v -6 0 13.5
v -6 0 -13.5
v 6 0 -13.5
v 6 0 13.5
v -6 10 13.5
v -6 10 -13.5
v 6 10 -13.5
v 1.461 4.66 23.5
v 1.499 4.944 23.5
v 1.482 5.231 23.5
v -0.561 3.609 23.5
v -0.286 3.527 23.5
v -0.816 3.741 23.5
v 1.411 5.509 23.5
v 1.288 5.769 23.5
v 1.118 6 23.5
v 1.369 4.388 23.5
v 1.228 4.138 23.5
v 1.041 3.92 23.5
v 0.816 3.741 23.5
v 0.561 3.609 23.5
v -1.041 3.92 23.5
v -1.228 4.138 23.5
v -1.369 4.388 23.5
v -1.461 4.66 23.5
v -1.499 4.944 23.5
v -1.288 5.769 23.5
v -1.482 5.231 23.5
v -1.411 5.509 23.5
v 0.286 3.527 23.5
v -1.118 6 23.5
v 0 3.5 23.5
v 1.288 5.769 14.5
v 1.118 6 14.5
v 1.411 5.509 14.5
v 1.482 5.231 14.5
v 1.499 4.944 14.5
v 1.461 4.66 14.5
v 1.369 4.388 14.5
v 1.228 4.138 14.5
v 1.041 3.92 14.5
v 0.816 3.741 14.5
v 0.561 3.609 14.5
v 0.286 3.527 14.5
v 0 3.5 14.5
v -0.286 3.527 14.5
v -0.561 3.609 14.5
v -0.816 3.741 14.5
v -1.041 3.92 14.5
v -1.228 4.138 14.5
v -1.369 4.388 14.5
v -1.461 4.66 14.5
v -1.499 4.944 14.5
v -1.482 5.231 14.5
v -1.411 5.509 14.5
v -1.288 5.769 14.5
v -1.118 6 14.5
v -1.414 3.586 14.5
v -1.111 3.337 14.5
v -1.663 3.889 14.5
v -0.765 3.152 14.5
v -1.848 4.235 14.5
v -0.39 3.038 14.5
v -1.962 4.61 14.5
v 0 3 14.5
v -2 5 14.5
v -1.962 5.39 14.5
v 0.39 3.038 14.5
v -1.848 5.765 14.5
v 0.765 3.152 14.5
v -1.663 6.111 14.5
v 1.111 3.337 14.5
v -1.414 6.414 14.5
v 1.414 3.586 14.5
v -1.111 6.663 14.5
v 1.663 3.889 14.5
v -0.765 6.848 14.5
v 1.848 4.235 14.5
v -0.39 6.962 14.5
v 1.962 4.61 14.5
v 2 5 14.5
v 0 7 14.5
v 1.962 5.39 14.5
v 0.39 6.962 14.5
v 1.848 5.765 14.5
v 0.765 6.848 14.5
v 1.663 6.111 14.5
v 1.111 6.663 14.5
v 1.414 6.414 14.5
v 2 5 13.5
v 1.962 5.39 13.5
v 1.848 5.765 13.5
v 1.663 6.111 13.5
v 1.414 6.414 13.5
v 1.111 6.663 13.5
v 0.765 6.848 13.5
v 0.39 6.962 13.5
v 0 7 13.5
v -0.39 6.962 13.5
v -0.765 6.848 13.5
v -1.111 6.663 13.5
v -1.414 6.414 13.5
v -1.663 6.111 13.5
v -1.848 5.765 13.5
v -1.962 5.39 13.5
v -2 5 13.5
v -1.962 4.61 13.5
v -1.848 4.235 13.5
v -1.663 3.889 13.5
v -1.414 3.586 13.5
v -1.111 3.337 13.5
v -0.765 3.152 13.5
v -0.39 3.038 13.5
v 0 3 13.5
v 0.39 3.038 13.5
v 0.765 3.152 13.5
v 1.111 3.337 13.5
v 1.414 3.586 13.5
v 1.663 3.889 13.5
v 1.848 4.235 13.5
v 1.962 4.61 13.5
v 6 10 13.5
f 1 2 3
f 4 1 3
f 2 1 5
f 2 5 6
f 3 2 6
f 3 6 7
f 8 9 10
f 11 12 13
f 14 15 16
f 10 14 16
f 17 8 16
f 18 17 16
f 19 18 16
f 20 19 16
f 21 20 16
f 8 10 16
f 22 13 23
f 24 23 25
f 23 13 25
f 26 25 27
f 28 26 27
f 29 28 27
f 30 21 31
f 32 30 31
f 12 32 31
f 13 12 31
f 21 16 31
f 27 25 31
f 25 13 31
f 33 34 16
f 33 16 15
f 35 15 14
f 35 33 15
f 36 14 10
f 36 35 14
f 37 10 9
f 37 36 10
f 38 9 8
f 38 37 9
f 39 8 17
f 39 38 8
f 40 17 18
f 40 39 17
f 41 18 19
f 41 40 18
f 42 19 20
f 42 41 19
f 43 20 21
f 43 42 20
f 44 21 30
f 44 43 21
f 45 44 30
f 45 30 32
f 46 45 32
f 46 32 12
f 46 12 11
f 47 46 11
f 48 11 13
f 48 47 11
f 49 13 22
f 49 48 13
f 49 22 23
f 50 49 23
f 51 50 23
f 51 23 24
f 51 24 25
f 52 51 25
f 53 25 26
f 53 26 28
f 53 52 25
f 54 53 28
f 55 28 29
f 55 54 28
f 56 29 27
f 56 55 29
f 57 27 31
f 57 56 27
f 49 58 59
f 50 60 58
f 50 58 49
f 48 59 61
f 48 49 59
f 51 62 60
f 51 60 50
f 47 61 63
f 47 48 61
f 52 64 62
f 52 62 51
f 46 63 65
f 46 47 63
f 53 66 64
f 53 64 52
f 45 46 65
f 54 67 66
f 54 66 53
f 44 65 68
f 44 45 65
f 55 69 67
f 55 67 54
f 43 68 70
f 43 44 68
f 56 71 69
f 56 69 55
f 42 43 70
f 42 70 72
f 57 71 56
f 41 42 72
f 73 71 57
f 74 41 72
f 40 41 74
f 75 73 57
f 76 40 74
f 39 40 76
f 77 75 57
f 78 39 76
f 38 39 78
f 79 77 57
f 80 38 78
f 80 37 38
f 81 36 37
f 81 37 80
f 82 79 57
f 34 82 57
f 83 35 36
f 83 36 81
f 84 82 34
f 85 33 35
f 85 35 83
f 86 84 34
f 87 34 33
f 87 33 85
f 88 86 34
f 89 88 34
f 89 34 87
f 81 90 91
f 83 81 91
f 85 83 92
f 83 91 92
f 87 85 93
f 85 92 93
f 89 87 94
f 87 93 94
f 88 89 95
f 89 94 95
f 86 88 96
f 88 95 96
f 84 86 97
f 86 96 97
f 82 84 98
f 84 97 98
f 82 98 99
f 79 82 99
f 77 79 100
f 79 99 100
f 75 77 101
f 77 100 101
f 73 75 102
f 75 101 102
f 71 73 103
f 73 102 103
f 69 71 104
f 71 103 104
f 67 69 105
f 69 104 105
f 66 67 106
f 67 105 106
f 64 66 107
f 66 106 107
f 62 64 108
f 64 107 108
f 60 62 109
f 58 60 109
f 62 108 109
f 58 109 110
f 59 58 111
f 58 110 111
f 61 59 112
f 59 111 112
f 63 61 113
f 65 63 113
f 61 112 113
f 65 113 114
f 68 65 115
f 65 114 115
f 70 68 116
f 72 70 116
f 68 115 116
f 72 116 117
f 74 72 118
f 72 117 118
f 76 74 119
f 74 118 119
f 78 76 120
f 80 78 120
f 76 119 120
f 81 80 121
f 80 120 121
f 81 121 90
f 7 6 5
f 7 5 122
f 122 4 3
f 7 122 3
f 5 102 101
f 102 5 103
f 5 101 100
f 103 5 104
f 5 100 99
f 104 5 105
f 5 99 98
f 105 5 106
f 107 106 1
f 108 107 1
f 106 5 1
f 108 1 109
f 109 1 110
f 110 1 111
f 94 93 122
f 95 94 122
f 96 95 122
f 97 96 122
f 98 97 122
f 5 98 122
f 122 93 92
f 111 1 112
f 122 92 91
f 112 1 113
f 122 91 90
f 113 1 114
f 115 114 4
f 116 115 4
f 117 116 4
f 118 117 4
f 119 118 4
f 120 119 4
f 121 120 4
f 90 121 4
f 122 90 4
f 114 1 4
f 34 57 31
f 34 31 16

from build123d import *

# Parameters (mm, degrees)
SKETCH2_W           = 12
SKETCH2_H           = 27
BOSS_EXTRUDE1_DEPTH = 10
SKETCH4_R           = 2
BOSS_EXTRUDE2_DEPTH = 1
BOSS_EXTRUDE3_DEPTH = 9


with BuildPart() as part:
    # Sketch2 → Boss-Extrude1 (new body)
    with BuildSketch(Plane(origin=(0, 0, 0), x_dir=(1, 0, 0), z_dir=(0, 1, 0))):
        Rectangle(SKETCH2_W, SKETCH2_H)
    extrude(amount=BOSS_EXTRUDE1_DEPTH)

    # Sketch4 → Boss-Extrude2 (add)
    with BuildSketch(Plane.XY.offset(13.5)):
        with Locations((0, 5)):
            Circle(SKETCH4_R)
    extrude(amount=BOSS_EXTRUDE2_DEPTH)

    # Sketch5 → Boss-Extrude3 (add)
    with BuildSketch(Plane.XY.offset(14.5)):
        with BuildLine():
            Line((-1.118033989, 6), (1.118033989, 6))
            ThreePointArc((1.118033989, 6), (0, 3.5), (-1.118033989, 6))
        make_face()
    extrude(amount=BOSS_EXTRUDE3_DEPTH)


solid = part.part
